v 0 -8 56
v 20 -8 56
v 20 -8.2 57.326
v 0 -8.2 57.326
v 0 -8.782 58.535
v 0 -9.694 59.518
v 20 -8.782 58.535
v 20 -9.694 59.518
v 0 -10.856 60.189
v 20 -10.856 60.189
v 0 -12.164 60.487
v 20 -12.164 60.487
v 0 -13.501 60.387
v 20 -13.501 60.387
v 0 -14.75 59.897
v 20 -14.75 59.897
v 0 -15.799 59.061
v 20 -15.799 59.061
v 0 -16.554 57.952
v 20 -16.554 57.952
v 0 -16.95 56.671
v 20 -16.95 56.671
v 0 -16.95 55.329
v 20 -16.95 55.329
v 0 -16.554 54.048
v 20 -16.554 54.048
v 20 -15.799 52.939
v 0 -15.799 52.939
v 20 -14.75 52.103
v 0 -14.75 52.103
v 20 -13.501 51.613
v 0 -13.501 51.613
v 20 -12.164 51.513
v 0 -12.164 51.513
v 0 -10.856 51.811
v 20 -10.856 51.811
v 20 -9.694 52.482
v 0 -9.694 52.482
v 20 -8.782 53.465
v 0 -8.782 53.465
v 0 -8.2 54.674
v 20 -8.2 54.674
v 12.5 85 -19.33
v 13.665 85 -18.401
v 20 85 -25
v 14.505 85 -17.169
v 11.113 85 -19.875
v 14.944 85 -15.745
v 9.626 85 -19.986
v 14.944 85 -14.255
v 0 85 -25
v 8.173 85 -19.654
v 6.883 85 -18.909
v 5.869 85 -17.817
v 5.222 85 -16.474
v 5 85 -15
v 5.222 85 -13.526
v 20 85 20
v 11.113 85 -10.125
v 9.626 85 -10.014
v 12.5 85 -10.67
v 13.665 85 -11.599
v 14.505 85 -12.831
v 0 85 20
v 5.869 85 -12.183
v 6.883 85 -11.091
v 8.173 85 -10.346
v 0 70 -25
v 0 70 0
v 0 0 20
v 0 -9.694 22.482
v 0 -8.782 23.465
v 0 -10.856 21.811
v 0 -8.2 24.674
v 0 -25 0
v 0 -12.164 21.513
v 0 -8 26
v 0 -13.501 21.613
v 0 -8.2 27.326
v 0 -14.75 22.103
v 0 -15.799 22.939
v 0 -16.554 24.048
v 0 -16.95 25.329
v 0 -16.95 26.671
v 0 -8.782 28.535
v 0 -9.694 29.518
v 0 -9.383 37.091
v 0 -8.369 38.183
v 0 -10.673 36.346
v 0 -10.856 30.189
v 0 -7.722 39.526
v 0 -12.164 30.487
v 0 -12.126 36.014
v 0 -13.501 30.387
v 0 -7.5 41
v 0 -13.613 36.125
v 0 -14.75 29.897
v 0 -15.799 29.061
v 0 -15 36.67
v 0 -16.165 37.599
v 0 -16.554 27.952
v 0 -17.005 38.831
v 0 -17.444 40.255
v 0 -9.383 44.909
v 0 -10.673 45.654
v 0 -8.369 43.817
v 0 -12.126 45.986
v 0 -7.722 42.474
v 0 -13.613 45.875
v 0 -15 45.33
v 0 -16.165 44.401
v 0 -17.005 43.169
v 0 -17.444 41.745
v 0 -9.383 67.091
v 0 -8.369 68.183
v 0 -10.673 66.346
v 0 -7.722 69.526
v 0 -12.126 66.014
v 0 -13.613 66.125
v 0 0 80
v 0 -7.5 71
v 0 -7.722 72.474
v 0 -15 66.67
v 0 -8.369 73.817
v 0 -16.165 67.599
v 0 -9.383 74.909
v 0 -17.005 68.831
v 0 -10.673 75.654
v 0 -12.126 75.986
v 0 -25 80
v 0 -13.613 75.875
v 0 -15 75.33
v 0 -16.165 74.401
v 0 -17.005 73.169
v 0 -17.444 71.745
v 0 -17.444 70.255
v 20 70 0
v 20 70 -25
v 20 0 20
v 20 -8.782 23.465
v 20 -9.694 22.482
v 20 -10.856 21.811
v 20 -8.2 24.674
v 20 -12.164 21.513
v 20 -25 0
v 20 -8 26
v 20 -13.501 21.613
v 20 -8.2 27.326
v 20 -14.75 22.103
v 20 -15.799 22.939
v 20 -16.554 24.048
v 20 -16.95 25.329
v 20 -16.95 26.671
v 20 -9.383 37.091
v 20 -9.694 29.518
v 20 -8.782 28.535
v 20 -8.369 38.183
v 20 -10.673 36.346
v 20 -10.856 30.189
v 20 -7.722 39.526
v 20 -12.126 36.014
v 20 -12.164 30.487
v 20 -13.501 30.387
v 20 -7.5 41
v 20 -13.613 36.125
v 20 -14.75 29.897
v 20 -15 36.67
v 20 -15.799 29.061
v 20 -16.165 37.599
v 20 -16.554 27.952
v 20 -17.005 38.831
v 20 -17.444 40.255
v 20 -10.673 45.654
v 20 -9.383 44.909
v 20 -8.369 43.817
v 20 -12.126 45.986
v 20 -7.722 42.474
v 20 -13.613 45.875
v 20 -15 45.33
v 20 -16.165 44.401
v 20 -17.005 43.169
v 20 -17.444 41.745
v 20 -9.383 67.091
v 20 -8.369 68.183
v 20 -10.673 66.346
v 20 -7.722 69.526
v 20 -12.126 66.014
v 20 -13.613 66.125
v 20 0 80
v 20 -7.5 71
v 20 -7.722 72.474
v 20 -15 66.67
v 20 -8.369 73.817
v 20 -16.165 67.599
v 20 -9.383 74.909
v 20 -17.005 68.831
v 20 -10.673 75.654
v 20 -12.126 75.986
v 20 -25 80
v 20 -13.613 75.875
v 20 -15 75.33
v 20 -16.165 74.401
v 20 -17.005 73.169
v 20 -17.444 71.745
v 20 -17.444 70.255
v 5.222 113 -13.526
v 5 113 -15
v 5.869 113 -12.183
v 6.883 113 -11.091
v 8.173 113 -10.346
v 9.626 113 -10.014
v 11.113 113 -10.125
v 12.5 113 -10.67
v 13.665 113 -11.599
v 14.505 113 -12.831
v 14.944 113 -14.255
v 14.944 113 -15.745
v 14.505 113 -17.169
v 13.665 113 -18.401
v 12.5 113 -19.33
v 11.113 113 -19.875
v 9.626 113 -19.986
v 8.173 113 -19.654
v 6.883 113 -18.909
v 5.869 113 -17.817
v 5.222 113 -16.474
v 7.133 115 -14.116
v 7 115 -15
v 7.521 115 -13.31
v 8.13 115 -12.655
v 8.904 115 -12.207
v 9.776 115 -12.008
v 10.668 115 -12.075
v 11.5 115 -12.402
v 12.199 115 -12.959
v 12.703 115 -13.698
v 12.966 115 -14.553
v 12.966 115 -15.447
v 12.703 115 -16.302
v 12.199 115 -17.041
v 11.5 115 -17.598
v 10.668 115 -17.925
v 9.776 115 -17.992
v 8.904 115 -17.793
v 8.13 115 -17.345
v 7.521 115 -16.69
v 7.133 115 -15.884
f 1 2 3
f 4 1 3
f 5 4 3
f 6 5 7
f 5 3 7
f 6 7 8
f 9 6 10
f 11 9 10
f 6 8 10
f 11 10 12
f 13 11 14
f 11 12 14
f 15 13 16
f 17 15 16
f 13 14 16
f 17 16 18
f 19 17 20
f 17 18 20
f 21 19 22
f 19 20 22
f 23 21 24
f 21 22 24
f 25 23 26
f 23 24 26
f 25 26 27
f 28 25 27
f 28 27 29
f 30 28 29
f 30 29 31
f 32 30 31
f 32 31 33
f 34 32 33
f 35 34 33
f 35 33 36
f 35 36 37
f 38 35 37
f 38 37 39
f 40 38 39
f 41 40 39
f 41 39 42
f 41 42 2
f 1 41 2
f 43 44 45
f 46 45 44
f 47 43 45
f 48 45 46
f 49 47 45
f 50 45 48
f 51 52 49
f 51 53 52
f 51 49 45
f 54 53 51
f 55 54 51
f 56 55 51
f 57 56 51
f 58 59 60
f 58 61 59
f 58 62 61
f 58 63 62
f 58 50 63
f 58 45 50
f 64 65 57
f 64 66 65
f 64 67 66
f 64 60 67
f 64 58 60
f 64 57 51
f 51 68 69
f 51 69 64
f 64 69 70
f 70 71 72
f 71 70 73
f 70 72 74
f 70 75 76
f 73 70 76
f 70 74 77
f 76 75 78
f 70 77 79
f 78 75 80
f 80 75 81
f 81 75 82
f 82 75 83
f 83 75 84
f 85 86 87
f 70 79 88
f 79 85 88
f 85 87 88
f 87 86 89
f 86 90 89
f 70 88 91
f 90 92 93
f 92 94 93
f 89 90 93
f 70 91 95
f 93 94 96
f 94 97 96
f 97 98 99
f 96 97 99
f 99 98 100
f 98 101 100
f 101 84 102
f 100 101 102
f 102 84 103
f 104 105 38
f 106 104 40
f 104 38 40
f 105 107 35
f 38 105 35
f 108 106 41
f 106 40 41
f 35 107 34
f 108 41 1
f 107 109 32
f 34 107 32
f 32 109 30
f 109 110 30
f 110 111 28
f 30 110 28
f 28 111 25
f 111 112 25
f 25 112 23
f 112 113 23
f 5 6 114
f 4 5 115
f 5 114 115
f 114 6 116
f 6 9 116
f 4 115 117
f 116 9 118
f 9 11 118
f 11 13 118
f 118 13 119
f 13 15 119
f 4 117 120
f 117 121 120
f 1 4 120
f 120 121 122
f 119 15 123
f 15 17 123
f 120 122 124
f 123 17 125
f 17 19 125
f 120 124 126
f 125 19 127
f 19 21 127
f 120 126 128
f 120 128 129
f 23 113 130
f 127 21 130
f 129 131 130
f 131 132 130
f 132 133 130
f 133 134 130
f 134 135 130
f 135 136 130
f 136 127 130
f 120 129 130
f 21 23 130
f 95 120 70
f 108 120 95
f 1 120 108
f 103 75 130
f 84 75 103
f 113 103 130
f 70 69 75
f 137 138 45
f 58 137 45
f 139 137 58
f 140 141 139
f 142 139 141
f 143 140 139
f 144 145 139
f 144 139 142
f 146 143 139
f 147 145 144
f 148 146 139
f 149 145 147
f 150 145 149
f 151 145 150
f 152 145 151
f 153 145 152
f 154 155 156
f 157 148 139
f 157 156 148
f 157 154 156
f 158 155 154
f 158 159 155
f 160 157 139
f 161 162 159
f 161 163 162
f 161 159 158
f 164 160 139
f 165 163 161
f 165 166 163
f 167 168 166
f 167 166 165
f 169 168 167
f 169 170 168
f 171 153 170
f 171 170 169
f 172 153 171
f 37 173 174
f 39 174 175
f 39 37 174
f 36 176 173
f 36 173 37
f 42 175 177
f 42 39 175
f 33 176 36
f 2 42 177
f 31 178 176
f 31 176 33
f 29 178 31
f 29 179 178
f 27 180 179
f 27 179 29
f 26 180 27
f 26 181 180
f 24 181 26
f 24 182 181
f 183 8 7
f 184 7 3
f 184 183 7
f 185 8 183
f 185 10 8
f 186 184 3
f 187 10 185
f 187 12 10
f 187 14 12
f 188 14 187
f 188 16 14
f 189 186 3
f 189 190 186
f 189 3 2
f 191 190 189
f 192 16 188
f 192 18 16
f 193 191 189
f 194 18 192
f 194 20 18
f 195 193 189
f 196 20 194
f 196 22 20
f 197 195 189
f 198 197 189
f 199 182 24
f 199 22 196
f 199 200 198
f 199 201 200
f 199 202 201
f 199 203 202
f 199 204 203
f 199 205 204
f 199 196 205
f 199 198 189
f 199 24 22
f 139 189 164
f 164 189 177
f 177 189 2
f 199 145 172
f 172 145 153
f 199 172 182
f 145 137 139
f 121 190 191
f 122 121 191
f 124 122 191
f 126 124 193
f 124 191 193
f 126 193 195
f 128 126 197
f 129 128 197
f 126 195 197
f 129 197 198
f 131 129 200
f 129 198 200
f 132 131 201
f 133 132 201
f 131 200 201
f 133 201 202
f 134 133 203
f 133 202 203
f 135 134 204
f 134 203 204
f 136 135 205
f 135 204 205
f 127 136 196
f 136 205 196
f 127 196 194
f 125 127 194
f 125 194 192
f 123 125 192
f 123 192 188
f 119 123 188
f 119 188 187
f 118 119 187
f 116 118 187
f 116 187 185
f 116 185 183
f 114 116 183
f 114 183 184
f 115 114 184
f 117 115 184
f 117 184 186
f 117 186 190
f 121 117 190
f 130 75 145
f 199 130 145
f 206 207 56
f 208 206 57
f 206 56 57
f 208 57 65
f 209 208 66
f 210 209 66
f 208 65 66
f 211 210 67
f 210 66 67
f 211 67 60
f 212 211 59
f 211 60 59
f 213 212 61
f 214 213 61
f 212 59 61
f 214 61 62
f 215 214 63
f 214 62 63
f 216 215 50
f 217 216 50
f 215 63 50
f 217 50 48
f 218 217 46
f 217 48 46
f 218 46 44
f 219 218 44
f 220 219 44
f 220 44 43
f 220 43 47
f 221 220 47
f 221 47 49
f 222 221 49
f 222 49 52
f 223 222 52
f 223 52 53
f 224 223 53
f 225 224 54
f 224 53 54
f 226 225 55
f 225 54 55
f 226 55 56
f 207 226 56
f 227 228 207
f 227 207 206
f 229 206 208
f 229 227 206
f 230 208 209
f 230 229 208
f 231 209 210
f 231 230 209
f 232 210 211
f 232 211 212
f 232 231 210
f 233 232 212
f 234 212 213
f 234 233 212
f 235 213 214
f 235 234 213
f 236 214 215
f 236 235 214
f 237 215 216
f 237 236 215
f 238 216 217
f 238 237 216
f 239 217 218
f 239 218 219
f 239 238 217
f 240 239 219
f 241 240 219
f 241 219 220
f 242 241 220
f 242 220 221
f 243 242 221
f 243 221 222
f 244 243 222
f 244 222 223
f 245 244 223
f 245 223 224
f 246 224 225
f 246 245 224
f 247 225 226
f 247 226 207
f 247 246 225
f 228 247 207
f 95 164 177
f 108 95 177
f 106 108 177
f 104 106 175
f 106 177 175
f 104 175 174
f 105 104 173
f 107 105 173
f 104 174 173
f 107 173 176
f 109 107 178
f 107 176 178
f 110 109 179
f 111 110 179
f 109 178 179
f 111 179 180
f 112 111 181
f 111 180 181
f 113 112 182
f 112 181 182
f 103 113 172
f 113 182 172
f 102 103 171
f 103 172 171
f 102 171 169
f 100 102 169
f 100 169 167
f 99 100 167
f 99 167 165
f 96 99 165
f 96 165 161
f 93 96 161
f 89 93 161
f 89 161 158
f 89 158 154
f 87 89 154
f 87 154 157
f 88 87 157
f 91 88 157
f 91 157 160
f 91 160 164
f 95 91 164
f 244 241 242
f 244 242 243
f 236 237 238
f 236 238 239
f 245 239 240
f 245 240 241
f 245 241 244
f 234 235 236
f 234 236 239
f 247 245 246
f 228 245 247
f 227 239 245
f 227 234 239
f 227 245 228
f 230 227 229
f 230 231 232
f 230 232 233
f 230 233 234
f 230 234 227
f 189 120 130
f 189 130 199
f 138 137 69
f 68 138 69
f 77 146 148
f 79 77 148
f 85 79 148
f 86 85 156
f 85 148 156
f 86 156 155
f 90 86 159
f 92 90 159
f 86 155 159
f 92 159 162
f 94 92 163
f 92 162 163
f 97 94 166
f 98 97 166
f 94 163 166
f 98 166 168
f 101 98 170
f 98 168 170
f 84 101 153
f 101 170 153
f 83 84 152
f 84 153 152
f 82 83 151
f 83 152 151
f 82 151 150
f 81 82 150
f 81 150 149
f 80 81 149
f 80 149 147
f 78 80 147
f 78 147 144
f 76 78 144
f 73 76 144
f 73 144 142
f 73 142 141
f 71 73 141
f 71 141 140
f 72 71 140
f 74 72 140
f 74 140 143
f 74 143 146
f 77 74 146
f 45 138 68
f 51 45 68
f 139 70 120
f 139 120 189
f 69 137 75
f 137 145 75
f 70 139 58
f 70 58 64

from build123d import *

# Parameters (mm, degrees)
F0_W     = 20
F0_H     = 25
F1_DEPTH = 80
F2_R     = 5
F2_R_2   = 4.5
F3_DEPTH = 25
F4_W     = 20
F4_H     = 20
F5_DEPTH = 70
F6_W     = 20
F6_H     = 45
F7_DEPTH = 15
F8_R     = 5
F9_DEPTH = 30
F10_SIZE = 2


with BuildPart() as f1:
    # F0 (on Top) → F1 (new body)
    with BuildSketch(Plane.XY):
        with Locations((10, -12.5)):
            Rectangle(F0_W, F0_H)
    extrude(amount=F1_DEPTH)

    # F2 (on face) → F3 (cut)
    with BuildSketch(Plane.YZ.offset(20)):
        with Locations((-12.5, 71)):
            Circle(F2_R)
        with Locations((-12.5, 56)):
            Circle(F2_R_2)
        with Locations((-12.5, 41)):
            Circle(F2_R)
        with Locations((-12.5, 26)):
            Circle(F2_R_2)
    extrude(amount=-F3_DEPTH, mode=Mode.SUBTRACT)

    # F4 (on face) → F5 (join)
    with BuildSketch(Plane(origin=(0, 0, 0), x_dir=(-1, 0, 0), z_dir=(0, 1, 0))):
        with Locations((-10, 10)):
            Rectangle(F4_W, F4_H)
    extrude(amount=F5_DEPTH)

    # F6 (on face) → F7 (join)
    with BuildSketch(Plane(origin=(0, 70, 0), x_dir=(-1, 0, 0), z_dir=(0, 1, 0))):
        with Locations((-10, -2.5)):
            Rectangle(F6_W, F6_H)
    extrude(amount=F7_DEPTH)

    # F8 (on face) → F9 (join)
    with BuildSketch(Plane(origin=(0, 85, 0), x_dir=(-1, 0, 0), z_dir=(0, 1, 0))):
        with Locations((-10, -15)):
            Circle(F8_R)
    extrude(amount=F9_DEPTH)

    # F10
    f10_edges = [f1.edges().sort_by_distance(p)[0] for p in [
        (15, 115, -15),
    ]]
    chamfer(f10_edges, length=F10_SIZE)


solid = f1.part
